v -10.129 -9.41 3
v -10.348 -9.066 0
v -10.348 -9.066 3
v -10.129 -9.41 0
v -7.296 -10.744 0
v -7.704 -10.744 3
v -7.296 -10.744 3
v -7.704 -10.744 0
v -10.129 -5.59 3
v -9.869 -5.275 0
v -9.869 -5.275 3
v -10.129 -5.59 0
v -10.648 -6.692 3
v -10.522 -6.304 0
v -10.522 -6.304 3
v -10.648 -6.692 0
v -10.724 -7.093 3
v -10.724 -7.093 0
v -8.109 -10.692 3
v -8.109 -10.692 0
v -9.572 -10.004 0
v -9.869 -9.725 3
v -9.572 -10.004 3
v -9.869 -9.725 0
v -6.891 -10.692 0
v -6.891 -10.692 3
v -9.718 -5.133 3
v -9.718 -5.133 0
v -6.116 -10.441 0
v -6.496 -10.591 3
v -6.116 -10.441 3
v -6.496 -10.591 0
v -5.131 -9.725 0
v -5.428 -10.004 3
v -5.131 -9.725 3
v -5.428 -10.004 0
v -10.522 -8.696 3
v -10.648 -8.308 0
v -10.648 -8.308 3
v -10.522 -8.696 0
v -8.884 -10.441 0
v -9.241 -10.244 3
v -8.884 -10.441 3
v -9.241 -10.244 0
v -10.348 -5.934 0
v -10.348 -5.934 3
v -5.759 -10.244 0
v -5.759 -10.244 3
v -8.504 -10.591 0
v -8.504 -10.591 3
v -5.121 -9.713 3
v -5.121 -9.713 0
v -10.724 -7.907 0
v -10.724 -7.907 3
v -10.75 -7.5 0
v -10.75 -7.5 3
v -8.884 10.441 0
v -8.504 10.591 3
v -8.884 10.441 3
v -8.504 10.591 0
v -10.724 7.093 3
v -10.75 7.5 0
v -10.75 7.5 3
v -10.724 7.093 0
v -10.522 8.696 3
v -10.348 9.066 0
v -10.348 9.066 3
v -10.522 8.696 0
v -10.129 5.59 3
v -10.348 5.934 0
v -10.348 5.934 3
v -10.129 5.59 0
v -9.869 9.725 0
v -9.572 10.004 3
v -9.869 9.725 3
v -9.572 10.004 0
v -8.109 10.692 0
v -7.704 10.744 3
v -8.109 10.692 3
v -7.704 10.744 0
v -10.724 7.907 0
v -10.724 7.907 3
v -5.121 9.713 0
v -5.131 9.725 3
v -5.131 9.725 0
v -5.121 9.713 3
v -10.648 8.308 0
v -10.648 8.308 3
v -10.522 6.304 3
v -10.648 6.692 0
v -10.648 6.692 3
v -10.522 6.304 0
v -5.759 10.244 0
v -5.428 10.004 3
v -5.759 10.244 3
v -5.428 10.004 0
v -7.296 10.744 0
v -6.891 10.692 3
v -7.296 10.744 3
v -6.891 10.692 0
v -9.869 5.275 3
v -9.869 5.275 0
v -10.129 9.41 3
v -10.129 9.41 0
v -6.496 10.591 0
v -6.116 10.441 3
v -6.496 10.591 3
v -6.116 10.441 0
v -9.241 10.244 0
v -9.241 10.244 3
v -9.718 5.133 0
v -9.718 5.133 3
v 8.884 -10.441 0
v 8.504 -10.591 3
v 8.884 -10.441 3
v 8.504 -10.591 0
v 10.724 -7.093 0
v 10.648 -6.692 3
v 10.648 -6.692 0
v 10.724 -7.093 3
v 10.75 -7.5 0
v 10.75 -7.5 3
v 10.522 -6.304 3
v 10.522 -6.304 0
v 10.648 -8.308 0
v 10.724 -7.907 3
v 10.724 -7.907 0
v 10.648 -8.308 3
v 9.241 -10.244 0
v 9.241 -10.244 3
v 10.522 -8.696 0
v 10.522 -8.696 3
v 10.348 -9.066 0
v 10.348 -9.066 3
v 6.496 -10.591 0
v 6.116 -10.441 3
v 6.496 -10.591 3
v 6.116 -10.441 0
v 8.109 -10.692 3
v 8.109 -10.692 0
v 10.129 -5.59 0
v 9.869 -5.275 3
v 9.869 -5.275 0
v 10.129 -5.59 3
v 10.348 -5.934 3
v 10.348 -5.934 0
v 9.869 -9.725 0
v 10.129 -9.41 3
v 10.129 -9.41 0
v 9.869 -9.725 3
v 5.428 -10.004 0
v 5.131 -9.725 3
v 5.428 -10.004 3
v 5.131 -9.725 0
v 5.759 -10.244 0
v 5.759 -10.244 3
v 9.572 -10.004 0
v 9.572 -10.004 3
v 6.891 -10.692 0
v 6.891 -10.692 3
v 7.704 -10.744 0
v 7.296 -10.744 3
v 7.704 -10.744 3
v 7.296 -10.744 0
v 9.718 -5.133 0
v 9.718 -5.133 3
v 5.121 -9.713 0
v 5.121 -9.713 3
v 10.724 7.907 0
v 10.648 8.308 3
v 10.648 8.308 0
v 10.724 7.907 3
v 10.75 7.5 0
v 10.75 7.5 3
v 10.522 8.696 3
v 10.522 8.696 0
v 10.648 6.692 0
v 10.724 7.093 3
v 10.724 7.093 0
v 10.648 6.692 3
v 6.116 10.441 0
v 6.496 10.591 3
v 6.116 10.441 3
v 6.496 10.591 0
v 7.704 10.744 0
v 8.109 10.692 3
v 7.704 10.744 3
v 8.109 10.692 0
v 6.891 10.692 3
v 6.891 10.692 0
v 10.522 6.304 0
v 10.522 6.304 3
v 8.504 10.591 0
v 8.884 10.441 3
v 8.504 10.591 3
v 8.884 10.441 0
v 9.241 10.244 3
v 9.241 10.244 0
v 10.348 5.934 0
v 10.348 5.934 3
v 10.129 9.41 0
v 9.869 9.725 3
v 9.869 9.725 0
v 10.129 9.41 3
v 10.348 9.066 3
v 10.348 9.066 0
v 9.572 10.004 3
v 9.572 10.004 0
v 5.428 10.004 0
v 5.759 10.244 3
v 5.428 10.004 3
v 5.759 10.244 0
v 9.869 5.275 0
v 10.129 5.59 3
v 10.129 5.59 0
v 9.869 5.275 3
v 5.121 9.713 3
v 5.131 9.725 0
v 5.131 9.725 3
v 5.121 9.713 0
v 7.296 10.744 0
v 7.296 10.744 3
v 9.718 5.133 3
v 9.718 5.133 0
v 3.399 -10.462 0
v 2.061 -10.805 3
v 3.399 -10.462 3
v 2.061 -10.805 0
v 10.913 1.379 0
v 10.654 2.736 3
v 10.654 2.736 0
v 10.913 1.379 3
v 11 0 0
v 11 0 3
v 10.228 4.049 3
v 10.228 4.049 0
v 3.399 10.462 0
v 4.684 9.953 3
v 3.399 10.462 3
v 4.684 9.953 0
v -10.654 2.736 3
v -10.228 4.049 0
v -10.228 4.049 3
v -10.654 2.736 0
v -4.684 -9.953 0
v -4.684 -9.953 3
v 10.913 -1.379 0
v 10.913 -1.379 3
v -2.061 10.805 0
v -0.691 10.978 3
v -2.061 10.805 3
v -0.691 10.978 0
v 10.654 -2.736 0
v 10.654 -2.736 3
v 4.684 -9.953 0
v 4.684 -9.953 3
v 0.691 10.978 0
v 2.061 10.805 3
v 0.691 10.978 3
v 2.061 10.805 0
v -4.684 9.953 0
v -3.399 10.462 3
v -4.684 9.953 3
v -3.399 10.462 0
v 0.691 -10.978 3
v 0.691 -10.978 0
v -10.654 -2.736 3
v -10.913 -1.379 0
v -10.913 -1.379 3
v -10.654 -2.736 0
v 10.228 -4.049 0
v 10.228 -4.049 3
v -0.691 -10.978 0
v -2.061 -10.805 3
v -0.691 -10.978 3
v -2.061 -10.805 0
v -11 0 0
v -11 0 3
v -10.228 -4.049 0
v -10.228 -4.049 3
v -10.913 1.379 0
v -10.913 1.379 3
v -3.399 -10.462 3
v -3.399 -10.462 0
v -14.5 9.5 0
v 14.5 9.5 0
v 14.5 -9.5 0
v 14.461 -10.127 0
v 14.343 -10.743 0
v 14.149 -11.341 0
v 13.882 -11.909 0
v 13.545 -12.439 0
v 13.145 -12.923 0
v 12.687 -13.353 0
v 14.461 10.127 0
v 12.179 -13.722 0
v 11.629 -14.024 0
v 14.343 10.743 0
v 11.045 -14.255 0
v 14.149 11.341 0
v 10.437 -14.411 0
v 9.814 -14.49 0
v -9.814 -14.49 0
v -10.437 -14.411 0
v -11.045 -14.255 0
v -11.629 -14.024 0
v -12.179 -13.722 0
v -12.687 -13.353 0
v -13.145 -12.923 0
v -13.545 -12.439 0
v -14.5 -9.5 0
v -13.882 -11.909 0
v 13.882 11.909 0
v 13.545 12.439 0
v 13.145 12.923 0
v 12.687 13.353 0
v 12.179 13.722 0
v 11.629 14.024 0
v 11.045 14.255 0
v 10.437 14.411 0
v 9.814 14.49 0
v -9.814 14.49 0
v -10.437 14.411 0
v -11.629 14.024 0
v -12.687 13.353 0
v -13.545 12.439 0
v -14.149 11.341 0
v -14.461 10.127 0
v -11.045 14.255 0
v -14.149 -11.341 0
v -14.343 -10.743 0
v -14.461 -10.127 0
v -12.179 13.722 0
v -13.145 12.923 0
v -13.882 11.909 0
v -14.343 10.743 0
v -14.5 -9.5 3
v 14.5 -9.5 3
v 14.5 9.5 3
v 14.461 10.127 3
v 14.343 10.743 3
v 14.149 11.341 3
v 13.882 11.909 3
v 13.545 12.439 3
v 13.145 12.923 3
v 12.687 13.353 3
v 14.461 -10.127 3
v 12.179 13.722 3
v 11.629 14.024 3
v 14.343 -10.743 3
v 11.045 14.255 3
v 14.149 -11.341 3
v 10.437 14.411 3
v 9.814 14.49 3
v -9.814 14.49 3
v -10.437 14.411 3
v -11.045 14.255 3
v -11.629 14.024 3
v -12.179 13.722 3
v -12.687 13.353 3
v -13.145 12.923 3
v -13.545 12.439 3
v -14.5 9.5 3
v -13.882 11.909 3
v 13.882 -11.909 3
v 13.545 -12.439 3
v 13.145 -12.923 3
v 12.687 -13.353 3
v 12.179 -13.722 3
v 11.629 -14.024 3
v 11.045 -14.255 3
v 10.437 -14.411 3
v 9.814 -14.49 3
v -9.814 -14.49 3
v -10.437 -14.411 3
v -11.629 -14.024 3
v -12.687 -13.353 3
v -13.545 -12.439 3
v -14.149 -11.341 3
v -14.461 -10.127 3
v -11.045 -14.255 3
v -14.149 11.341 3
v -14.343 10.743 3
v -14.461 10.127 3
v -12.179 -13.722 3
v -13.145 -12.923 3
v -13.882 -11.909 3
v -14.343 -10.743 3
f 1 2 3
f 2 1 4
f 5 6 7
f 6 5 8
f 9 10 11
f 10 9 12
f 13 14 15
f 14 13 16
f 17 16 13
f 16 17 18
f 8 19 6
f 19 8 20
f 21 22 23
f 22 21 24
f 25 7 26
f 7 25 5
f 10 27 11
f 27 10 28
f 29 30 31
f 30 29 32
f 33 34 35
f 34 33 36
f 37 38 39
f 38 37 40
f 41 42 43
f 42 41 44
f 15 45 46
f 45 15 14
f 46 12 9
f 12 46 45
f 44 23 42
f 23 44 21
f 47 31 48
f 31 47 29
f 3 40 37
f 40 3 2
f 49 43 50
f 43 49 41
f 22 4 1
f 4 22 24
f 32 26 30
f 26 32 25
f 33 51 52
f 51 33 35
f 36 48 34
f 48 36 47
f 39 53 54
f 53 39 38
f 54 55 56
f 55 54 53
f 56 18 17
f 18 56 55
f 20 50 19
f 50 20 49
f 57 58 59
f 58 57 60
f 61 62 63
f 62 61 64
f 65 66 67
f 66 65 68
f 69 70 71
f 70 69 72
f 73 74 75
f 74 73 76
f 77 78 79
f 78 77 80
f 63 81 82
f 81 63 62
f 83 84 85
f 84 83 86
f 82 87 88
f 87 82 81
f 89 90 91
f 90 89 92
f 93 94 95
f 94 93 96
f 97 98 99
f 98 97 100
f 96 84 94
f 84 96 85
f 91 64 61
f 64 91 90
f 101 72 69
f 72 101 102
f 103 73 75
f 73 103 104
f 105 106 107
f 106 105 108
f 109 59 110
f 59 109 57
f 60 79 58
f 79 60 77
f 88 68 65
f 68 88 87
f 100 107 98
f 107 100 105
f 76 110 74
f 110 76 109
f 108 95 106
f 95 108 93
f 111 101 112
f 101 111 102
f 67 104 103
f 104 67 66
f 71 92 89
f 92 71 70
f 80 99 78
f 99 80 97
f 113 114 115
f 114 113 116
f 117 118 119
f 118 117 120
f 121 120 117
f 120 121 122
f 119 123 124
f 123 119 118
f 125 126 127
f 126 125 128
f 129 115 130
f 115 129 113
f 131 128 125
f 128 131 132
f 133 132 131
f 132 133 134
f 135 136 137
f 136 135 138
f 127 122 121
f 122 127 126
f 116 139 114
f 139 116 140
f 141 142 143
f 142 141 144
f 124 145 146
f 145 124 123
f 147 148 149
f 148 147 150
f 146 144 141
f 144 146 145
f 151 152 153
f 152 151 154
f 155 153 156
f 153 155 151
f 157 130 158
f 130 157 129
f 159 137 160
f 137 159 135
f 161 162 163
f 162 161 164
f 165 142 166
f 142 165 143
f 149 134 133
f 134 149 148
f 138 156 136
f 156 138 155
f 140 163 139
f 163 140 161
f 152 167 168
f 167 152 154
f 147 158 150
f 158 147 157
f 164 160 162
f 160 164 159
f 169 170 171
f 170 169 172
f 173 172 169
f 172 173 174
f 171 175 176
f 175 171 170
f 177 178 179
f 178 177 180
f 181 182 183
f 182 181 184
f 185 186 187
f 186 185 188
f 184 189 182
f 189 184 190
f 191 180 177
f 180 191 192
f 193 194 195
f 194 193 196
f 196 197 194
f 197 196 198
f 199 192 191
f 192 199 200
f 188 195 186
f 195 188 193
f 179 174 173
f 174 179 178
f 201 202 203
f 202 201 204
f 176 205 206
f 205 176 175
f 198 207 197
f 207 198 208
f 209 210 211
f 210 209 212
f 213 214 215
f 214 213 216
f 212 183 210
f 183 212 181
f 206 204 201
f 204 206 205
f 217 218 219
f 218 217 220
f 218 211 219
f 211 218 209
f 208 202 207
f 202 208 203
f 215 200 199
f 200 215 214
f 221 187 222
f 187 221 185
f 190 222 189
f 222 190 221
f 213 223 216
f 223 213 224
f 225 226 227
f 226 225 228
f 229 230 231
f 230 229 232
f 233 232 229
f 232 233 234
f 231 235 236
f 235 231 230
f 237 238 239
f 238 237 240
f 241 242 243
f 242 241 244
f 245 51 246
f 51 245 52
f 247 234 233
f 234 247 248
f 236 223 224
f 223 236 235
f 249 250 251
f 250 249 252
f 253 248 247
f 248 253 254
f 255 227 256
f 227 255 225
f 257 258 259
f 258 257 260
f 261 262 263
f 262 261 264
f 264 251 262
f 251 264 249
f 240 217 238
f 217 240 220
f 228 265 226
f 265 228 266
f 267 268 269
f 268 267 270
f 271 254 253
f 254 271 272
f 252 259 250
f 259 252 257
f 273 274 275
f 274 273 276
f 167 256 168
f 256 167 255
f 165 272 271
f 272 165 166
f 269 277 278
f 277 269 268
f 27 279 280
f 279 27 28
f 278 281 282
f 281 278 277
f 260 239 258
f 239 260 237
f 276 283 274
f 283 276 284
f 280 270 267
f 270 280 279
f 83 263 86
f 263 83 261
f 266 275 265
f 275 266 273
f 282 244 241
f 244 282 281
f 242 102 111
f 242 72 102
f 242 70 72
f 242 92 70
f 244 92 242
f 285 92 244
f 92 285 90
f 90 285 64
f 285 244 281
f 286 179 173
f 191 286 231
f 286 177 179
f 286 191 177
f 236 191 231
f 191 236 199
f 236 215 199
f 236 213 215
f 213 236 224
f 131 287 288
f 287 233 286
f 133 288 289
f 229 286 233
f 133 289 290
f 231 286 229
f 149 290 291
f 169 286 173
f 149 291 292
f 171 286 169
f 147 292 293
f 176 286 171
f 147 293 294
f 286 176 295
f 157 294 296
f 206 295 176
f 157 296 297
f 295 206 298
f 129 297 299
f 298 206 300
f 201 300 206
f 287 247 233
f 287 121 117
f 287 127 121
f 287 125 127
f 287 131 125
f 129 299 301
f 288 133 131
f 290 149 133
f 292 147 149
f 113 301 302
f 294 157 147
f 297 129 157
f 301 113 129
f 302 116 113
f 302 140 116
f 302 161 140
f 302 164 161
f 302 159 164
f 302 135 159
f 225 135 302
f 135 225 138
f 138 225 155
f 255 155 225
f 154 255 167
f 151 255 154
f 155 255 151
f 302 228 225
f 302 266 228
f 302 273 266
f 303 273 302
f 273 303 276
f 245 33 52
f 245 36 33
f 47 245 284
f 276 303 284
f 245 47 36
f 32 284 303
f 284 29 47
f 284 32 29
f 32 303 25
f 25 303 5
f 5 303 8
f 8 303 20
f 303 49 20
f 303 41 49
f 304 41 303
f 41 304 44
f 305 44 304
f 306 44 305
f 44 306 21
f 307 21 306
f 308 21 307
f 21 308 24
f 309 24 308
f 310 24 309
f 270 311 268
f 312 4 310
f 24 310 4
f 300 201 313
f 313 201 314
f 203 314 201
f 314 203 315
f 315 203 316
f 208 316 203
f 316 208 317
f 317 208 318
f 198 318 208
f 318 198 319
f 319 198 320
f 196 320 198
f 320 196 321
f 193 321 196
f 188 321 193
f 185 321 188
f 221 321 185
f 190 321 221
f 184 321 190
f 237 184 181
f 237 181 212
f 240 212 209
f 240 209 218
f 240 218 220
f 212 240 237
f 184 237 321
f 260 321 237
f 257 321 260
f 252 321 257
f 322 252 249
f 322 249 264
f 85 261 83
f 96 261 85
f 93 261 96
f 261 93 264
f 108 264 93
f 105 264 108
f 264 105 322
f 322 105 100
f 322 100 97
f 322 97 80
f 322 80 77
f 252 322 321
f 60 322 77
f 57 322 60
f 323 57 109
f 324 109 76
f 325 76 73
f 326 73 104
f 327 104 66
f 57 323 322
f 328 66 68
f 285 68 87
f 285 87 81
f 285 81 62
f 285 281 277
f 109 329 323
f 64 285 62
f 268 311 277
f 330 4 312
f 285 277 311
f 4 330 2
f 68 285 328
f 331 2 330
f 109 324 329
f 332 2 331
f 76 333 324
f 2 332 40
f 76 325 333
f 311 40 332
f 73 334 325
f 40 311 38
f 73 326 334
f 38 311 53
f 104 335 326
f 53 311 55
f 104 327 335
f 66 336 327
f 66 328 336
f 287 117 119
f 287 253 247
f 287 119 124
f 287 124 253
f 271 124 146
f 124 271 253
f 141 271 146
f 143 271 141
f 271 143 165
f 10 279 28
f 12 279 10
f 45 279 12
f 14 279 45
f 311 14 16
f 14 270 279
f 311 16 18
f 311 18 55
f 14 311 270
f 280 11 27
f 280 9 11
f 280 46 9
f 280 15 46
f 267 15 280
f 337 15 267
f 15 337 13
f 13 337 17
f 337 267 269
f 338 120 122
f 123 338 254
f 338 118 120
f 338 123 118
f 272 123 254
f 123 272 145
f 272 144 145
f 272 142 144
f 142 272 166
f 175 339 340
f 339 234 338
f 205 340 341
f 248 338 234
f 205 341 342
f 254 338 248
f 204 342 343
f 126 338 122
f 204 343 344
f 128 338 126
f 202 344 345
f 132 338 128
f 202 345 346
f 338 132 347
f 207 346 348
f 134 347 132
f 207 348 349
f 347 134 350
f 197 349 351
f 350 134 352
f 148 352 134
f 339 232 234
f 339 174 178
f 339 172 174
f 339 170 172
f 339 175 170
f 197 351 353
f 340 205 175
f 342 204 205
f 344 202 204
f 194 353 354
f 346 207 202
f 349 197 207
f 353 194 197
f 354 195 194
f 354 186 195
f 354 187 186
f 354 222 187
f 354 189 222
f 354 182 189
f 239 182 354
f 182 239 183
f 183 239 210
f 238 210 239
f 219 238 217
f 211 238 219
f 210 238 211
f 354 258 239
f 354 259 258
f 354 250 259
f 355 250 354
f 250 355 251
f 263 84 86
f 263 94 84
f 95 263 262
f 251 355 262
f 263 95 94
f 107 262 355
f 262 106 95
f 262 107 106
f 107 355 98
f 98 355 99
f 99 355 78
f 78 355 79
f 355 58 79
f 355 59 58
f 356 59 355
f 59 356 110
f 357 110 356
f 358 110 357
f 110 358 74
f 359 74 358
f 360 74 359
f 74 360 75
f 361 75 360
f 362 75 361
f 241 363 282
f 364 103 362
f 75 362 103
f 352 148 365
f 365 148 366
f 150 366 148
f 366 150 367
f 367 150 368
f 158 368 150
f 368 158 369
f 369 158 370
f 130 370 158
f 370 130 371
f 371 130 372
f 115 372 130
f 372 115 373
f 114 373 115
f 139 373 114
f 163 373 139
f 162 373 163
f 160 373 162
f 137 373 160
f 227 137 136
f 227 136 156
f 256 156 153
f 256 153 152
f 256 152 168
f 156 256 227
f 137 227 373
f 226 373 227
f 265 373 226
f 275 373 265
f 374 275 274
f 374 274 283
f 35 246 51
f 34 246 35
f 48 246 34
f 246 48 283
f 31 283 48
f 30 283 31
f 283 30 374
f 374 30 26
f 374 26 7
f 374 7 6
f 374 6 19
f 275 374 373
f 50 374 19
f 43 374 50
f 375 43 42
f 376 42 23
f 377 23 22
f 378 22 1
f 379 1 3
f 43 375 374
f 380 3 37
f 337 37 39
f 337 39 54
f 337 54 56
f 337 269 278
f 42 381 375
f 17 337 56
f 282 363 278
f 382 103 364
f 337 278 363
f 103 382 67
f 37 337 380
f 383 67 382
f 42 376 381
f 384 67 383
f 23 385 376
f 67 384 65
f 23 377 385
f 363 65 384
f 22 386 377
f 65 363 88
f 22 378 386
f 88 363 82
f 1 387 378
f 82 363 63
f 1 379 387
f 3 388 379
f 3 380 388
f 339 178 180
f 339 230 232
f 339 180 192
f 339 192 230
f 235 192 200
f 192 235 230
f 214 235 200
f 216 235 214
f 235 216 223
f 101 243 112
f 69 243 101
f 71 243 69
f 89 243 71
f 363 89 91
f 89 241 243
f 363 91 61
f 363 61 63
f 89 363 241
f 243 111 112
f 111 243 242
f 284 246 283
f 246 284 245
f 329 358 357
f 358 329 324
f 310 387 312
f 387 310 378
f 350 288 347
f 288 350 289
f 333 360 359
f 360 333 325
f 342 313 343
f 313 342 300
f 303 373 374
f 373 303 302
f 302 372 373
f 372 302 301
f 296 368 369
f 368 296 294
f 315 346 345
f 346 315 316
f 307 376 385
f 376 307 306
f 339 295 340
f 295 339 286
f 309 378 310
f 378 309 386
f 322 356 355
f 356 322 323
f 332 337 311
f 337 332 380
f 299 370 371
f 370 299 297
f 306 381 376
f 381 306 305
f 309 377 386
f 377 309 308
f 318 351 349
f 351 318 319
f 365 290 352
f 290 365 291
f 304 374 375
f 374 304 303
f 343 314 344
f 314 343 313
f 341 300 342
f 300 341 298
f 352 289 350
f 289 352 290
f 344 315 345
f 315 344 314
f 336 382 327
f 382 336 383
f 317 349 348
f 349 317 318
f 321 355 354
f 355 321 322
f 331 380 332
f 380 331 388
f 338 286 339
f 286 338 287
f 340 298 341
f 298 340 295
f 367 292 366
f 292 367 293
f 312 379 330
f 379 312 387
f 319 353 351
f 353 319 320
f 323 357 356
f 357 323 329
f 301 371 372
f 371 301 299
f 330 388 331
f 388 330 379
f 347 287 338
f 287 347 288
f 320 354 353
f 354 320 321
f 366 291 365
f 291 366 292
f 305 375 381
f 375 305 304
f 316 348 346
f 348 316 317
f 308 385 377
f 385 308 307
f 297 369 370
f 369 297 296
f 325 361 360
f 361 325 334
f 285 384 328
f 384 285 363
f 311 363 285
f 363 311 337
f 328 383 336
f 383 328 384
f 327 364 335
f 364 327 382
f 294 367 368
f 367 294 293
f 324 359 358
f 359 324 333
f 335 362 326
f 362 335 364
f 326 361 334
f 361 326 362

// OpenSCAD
$fn = 50;


difference() {
	union() {
		hull() {
			translate(v = [-9.5000000000, 9.5000000000, 0]) {
				cylinder(h = 3, r = 5);
			}
			translate(v = [9.5000000000, 9.5000000000, 0]) {
				cylinder(h = 3, r = 5);
			}
			translate(v = [-9.5000000000, -9.5000000000, 0]) {
				cylinder(h = 3, r = 5);
			}
			translate(v = [9.5000000000, -9.5000000000, 0]) {
				cylinder(h = 3, r = 5);
			}
		}
	}
	union() {
		#translate(v = [-7.5000000000, -7.5000000000, -100.0000000000]) {
			cylinder(h = 200, r = 3.2500000000);
		}
		#translate(v = [-7.5000000000, 7.5000000000, -100.0000000000]) {
			cylinder(h = 200, r = 3.2500000000);
		}
		#translate(v = [7.5000000000, -7.5000000000, -100.0000000000]) {
			cylinder(h = 200, r = 3.2500000000);
		}
		#translate(v = [7.5000000000, 7.5000000000, -100.0000000000]) {
			cylinder(h = 200, r = 3.2500000000);
		}
		#cylinder(h = 3, r = 11.0000000000);
	}
}
